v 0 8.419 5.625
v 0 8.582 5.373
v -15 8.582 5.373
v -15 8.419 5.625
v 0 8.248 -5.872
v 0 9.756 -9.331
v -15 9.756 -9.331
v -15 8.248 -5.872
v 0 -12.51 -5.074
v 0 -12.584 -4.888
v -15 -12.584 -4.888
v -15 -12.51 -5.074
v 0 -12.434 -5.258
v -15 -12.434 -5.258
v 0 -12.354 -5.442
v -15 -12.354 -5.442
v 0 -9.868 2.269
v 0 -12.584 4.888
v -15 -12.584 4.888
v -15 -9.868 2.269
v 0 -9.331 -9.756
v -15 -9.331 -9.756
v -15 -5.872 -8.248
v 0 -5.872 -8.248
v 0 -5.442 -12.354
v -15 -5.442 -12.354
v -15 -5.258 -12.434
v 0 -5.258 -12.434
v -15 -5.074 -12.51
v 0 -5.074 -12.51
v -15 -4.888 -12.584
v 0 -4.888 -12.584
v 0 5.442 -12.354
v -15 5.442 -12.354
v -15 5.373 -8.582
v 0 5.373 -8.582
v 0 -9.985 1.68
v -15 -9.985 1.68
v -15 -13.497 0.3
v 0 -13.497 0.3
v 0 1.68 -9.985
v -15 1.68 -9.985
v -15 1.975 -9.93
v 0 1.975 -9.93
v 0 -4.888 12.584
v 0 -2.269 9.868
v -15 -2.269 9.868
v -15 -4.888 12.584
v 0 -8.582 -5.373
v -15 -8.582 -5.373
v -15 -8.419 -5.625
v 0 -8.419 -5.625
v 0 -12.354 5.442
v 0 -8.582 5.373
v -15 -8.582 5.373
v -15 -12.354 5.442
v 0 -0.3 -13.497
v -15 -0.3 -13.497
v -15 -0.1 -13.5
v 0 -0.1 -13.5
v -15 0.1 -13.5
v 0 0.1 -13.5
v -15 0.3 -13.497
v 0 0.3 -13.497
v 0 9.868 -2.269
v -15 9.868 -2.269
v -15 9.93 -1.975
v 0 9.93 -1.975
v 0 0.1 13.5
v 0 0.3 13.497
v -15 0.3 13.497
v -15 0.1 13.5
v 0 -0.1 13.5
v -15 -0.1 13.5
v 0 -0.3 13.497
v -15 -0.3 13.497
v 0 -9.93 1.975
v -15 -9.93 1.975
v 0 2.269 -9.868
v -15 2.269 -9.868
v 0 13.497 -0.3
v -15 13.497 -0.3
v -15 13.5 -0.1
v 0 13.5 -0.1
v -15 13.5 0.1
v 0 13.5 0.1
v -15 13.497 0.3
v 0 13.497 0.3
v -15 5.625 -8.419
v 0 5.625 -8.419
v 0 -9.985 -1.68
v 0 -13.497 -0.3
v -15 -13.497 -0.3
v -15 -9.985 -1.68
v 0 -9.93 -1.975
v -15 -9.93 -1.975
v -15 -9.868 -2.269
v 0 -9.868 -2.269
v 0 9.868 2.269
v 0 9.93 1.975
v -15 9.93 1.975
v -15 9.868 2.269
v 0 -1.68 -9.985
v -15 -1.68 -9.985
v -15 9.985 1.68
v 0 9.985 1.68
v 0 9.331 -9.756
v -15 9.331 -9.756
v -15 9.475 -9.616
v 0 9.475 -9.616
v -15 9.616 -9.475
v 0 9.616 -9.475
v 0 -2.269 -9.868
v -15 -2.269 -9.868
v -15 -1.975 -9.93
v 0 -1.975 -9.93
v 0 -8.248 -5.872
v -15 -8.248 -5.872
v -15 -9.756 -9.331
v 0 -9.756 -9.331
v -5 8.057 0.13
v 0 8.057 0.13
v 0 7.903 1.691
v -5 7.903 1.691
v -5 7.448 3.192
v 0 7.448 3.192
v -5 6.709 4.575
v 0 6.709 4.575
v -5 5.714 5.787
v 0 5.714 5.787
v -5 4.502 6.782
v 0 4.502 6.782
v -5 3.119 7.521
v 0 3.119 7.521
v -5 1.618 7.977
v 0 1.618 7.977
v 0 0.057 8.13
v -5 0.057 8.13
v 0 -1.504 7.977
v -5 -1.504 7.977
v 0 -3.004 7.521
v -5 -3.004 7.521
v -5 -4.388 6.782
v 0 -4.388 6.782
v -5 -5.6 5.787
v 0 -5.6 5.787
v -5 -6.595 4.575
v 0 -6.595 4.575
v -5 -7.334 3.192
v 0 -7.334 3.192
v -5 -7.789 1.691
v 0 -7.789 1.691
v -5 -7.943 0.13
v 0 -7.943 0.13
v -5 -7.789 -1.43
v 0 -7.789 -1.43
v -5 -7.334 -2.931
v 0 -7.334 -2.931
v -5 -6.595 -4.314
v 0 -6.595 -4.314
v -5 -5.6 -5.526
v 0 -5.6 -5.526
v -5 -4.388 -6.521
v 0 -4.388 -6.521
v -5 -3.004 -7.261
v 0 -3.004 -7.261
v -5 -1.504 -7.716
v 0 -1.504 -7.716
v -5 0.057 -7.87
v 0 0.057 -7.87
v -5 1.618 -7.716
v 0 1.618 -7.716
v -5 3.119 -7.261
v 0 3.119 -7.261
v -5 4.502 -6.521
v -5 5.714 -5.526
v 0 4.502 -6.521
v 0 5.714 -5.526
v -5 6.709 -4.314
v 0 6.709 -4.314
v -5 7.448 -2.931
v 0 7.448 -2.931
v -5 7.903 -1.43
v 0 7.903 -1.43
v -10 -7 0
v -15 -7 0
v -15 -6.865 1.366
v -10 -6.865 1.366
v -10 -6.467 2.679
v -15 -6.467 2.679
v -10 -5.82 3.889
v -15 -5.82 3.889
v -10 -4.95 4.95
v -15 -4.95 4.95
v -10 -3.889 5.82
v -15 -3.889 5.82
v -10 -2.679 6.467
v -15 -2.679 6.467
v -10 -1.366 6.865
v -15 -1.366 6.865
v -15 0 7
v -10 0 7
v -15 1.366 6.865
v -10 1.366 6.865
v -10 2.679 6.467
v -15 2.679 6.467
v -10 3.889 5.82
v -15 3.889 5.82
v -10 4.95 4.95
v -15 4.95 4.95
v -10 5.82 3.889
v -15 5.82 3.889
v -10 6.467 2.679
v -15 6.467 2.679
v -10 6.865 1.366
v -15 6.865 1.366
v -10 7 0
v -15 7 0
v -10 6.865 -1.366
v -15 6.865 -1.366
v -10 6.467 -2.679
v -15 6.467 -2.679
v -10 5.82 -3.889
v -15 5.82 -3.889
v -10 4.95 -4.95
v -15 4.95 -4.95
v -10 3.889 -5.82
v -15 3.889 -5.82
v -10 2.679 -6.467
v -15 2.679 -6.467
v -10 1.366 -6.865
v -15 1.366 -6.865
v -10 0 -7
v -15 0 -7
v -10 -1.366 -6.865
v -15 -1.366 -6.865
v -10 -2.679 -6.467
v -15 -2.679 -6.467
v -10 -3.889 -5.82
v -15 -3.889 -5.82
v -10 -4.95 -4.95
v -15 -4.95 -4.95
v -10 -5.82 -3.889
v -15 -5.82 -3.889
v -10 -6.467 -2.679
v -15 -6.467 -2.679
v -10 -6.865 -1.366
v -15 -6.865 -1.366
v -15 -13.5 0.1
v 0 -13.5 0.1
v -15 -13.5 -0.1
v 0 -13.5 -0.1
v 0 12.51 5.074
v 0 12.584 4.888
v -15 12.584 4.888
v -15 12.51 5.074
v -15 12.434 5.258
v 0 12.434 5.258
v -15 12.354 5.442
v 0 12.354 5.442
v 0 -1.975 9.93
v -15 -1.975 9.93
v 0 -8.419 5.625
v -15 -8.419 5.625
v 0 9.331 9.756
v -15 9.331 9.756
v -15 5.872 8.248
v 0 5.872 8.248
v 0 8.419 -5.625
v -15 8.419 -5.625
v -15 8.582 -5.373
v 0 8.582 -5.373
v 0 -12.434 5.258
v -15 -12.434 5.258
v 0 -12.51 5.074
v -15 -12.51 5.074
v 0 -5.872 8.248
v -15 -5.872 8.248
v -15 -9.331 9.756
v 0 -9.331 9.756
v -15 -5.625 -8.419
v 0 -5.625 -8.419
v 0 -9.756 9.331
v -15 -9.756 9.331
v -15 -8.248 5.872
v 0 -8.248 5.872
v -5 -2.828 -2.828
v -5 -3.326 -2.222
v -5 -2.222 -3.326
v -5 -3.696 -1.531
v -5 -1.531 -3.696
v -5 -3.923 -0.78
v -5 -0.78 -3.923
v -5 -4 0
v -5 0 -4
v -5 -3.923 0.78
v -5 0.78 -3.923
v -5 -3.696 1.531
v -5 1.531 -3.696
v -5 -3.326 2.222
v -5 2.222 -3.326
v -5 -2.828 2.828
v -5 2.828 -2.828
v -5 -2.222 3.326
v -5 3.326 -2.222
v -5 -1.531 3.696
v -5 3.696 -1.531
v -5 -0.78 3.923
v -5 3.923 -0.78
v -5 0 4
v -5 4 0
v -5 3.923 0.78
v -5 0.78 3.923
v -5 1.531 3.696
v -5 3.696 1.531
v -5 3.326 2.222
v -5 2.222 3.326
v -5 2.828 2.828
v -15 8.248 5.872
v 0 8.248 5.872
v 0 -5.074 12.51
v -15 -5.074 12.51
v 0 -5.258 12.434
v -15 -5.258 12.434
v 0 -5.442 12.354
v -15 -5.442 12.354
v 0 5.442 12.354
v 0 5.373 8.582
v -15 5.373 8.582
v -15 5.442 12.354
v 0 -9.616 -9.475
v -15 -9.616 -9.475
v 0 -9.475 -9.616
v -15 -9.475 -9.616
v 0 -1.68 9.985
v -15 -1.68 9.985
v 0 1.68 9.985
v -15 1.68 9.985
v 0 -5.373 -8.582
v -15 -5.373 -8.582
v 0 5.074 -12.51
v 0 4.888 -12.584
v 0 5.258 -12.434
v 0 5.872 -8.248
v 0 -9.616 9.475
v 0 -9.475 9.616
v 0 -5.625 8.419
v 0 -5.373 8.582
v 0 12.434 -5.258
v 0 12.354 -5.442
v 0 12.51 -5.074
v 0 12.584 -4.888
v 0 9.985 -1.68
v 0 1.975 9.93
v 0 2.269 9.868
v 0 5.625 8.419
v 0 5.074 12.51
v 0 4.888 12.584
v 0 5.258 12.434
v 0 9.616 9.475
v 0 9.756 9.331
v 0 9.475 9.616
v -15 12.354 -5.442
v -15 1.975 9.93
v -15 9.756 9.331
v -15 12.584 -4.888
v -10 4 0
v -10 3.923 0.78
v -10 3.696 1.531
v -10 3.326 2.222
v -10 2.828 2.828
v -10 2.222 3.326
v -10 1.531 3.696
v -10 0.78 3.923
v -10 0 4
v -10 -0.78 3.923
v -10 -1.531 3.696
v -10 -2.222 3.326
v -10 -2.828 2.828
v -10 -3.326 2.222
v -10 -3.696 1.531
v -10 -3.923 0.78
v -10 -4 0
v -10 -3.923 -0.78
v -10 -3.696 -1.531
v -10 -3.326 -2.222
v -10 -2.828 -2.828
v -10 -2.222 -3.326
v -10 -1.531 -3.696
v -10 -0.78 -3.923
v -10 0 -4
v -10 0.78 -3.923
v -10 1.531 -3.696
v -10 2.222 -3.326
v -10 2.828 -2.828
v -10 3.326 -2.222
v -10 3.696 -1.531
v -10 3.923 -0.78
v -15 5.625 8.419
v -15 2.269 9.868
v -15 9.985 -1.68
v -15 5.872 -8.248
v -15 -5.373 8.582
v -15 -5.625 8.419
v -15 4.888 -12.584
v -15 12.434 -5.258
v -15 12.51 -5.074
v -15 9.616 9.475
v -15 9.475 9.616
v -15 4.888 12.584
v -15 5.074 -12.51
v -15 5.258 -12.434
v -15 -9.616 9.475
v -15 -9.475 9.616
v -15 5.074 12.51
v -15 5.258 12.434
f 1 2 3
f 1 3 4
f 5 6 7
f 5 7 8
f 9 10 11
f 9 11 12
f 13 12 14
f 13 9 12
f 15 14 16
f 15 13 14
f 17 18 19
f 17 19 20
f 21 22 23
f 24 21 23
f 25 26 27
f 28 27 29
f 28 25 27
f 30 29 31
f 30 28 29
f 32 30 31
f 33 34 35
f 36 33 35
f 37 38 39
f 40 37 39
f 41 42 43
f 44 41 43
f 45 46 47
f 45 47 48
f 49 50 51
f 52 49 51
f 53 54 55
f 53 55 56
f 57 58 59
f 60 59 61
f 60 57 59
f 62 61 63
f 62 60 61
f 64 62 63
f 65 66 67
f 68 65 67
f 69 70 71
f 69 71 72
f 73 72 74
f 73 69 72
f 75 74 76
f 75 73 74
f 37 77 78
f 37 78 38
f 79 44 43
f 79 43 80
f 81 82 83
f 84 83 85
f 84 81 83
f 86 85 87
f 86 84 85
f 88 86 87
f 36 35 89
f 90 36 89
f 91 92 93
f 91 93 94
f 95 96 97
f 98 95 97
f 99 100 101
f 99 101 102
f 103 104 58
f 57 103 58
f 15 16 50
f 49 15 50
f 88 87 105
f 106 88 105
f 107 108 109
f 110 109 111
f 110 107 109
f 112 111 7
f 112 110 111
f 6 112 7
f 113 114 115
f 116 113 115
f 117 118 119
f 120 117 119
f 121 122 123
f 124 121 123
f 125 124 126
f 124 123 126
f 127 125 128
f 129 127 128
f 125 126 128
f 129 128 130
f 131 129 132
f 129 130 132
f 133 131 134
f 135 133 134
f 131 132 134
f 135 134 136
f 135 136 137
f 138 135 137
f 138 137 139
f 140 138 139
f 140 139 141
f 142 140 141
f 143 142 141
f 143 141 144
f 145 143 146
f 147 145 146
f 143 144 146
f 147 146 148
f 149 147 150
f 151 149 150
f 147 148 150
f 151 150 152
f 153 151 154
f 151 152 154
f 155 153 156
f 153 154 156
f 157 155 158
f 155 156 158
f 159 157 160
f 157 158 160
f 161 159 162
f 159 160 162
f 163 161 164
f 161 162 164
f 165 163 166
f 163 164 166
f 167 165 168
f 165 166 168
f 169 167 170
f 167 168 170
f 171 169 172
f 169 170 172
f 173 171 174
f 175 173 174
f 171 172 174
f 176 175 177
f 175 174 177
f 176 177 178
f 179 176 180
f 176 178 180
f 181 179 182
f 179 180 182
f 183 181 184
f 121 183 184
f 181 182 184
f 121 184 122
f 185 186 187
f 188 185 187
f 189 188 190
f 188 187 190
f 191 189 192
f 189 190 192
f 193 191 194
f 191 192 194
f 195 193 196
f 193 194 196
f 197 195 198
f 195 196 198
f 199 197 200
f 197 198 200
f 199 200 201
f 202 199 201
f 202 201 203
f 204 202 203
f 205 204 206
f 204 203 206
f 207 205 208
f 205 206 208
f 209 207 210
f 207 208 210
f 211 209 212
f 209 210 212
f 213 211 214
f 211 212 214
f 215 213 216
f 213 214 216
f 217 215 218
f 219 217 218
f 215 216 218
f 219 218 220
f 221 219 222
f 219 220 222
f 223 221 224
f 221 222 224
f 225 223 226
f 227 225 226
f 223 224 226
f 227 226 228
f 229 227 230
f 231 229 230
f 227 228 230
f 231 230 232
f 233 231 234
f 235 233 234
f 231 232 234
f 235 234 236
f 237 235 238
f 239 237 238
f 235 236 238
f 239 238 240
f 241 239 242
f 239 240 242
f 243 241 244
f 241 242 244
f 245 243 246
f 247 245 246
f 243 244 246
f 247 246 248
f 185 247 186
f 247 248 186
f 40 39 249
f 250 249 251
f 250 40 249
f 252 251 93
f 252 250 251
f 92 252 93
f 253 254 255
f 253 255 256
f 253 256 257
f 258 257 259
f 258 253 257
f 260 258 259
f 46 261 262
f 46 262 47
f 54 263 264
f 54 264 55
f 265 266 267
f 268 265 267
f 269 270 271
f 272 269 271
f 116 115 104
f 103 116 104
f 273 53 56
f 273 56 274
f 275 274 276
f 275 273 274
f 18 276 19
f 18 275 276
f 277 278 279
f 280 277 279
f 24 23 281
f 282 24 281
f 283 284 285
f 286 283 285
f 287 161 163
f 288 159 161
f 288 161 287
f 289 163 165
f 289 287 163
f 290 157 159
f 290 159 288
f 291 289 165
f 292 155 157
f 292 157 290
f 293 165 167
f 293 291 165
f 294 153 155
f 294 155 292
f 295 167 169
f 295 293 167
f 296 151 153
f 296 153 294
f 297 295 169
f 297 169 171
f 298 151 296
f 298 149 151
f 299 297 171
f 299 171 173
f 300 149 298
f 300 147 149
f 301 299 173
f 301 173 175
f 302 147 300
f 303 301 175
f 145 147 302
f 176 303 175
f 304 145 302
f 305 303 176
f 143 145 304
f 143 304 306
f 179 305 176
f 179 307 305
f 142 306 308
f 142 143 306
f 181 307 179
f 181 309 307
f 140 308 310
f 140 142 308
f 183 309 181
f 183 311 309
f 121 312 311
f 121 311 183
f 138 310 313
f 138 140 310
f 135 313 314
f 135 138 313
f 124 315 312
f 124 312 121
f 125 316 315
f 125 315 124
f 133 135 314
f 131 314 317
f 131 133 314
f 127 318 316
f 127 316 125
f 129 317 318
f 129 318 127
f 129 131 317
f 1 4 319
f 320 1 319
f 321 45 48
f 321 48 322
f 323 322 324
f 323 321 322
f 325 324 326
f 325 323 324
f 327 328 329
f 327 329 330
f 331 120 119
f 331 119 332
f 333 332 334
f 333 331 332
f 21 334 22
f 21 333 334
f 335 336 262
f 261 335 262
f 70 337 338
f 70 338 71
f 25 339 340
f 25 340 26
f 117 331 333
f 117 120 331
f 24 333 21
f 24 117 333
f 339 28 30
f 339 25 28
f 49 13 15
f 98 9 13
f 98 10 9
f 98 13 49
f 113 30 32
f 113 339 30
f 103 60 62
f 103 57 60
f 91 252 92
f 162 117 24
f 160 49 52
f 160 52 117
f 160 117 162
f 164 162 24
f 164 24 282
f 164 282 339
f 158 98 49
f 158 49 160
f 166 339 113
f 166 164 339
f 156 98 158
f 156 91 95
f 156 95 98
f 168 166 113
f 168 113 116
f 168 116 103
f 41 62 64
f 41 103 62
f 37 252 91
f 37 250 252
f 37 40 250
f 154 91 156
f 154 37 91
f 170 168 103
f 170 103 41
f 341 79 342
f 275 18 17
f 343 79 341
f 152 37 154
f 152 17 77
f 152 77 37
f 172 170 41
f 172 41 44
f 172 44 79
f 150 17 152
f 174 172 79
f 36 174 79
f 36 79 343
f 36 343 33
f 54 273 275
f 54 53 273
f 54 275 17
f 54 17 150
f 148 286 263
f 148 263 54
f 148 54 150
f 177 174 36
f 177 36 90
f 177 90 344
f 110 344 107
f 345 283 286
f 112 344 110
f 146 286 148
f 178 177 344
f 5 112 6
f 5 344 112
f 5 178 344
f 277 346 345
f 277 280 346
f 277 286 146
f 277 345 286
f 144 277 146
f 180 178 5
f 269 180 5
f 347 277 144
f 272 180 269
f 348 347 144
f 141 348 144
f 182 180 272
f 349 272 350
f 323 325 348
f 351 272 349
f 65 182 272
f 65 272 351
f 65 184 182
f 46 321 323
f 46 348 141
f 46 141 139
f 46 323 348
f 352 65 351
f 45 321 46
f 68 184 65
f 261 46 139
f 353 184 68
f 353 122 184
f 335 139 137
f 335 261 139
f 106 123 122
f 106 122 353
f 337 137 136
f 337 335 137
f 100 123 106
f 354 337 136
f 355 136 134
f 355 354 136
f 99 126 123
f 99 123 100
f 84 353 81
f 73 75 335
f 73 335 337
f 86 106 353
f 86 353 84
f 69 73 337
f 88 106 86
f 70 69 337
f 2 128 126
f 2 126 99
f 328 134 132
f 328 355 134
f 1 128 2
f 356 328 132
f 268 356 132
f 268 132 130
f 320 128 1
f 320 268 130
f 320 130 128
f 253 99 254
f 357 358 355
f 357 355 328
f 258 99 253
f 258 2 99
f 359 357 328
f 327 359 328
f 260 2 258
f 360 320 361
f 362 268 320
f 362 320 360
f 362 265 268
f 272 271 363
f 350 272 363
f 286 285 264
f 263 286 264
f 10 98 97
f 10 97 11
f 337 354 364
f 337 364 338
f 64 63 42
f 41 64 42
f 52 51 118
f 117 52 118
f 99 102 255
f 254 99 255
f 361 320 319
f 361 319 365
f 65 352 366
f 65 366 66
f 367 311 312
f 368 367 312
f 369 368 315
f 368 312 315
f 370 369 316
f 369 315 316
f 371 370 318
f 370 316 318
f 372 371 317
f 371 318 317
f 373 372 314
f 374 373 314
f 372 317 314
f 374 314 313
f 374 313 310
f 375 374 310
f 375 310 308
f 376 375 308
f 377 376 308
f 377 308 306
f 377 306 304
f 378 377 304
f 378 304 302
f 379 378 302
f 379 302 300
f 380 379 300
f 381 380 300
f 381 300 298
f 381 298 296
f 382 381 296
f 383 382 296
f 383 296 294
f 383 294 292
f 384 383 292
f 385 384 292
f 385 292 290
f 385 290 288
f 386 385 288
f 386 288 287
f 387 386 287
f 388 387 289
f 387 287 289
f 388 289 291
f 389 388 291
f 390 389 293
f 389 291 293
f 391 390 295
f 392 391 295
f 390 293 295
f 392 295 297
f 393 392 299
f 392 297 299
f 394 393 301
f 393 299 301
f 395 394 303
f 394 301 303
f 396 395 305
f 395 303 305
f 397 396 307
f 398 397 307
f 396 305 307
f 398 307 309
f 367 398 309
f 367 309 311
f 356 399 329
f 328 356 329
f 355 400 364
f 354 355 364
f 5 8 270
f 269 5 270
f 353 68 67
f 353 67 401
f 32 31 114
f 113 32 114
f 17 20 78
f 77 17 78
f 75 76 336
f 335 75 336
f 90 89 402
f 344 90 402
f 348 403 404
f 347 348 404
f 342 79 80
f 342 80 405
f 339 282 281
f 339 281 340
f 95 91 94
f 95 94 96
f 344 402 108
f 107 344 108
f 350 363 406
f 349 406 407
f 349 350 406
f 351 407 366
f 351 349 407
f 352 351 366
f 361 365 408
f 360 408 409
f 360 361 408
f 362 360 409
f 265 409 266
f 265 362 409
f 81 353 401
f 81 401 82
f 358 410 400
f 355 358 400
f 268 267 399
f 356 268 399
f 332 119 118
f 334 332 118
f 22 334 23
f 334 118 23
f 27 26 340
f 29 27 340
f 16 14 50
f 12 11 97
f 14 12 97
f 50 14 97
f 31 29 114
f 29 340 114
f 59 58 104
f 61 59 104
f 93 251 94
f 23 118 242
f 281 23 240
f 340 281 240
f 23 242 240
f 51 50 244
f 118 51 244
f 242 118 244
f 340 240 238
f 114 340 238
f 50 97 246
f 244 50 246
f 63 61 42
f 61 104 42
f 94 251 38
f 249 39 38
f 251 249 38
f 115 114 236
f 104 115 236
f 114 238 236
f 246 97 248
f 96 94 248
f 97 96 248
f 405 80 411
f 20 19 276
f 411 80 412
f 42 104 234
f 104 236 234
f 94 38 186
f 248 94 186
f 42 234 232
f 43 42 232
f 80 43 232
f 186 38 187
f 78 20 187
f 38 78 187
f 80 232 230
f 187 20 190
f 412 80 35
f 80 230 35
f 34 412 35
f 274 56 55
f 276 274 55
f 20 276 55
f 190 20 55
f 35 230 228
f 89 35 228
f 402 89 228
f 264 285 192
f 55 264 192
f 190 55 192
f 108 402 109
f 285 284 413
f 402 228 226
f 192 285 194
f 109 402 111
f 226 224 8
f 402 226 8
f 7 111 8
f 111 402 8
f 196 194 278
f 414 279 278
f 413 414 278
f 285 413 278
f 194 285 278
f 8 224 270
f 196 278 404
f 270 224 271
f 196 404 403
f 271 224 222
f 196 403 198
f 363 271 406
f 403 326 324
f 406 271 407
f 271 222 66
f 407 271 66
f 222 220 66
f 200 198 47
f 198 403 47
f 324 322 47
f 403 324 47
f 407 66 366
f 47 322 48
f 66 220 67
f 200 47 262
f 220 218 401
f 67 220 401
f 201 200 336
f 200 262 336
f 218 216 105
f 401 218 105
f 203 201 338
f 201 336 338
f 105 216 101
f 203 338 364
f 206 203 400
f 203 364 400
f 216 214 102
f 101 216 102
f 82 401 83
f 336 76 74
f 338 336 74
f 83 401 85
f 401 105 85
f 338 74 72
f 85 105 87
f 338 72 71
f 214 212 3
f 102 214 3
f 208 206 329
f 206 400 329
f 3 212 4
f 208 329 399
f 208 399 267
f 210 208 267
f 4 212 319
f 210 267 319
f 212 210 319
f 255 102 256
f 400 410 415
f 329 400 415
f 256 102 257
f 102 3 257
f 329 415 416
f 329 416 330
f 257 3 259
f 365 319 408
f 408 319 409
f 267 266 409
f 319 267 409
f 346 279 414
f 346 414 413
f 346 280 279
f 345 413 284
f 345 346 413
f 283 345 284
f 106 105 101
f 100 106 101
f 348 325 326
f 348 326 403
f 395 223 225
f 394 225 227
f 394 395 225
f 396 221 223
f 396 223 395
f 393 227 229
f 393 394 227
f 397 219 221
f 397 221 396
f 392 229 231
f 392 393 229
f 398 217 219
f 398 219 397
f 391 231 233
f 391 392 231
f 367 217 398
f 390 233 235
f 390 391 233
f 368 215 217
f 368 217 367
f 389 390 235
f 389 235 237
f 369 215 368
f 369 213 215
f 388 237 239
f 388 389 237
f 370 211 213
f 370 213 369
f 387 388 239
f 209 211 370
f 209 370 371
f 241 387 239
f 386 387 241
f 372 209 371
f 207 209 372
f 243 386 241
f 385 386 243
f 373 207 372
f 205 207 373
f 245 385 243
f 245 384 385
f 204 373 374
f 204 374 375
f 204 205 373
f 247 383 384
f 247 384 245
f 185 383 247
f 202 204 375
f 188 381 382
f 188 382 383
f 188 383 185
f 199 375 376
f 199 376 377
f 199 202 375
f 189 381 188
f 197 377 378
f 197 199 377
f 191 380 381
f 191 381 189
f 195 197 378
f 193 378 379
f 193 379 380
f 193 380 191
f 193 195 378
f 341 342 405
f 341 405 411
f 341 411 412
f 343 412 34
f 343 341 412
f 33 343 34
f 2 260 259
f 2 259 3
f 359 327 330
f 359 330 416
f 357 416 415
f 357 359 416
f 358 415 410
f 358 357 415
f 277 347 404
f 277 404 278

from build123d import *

# Parameters (mm, degrees)
F0_R            = 13.5
F1_DEPTH        = 15
F2_R            = 7
F3_DEPTH        = 5
F5_DEPTH        = 15.001
F5_COPIES_COUNT = 16
F6_R            = 8
F7_DEPTH        = 5
F8_R            = 4
F9_DEPTH        = 10.001


# Not quite as in the source:
# - a pattern or mirror of a feature is missing from the dataset's text; its kind, count and spacing are read off the source's solid


with BuildPart() as f1:
    # F0 (on Right) → F1 (new body)
    with BuildSketch(Plane.YZ):
        Circle(F0_R)
    extrude(amount=-F1_DEPTH)

    # F2 (on face) → F3 (cut)
    with BuildSketch(Plane(origin=(-15, 0, 0), x_dir=(0, -1, 0), z_dir=(-1, 0, 0))):
        Circle(F2_R)
    extrude(amount=-F3_DEPTH, mode=Mode.SUBTRACT)

    # F4 (on face) → F5 (cut, through all)
    with BuildSketch(Plane(origin=(-15, 0, 0), x_dir=(0, -1, 0), z_dir=(-1, 0, 0))):
        with BuildLine():
            Line((2.2686257354, 9.8675712449), (4.8878039751, 12.5840920332))
            ThreePointArc((4.8878039751, 12.5840920332), (2.6337193472, 13.2406012854), (0.2999814809, 13.4966666667))
            Line((0.2999814809, 13.4966666667), (1.6802191492, 9.9846125919))
            Line((1.6802191492, 9.9846125919), (1.9752895104, 9.9304509641))
            Line((1.9752895104, 9.9304509641), (2.2686257354, 9.8675712449))
        make_face()
    f5 = extrude(amount=-F5_DEPTH, mode=Mode.SUBTRACT)

    # F5_copies: F5 ×16 about axis
    f5_copies_axis = Axis((0, 0, 0), (1, 0, 0))
    for i in range(1, F5_COPIES_COUNT):
        add(f5.rotate(f5_copies_axis, i * 360 / F5_COPIES_COUNT), mode=Mode.SUBTRACT)

    # F6 (on face) → F7 (cut)
    with BuildSketch(Plane.YZ):
        with Locations((0.0570340926, 0.13036374)):
            Circle(F6_R)
    extrude(amount=-F7_DEPTH, mode=Mode.SUBTRACT)

    # F8 (on face) → F9 (cut, through all)
    with BuildSketch(Plane.YZ.offset(-5)):
        Circle(F8_R)
    extrude(amount=-F9_DEPTH, mode=Mode.SUBTRACT)


solid = f1.part
